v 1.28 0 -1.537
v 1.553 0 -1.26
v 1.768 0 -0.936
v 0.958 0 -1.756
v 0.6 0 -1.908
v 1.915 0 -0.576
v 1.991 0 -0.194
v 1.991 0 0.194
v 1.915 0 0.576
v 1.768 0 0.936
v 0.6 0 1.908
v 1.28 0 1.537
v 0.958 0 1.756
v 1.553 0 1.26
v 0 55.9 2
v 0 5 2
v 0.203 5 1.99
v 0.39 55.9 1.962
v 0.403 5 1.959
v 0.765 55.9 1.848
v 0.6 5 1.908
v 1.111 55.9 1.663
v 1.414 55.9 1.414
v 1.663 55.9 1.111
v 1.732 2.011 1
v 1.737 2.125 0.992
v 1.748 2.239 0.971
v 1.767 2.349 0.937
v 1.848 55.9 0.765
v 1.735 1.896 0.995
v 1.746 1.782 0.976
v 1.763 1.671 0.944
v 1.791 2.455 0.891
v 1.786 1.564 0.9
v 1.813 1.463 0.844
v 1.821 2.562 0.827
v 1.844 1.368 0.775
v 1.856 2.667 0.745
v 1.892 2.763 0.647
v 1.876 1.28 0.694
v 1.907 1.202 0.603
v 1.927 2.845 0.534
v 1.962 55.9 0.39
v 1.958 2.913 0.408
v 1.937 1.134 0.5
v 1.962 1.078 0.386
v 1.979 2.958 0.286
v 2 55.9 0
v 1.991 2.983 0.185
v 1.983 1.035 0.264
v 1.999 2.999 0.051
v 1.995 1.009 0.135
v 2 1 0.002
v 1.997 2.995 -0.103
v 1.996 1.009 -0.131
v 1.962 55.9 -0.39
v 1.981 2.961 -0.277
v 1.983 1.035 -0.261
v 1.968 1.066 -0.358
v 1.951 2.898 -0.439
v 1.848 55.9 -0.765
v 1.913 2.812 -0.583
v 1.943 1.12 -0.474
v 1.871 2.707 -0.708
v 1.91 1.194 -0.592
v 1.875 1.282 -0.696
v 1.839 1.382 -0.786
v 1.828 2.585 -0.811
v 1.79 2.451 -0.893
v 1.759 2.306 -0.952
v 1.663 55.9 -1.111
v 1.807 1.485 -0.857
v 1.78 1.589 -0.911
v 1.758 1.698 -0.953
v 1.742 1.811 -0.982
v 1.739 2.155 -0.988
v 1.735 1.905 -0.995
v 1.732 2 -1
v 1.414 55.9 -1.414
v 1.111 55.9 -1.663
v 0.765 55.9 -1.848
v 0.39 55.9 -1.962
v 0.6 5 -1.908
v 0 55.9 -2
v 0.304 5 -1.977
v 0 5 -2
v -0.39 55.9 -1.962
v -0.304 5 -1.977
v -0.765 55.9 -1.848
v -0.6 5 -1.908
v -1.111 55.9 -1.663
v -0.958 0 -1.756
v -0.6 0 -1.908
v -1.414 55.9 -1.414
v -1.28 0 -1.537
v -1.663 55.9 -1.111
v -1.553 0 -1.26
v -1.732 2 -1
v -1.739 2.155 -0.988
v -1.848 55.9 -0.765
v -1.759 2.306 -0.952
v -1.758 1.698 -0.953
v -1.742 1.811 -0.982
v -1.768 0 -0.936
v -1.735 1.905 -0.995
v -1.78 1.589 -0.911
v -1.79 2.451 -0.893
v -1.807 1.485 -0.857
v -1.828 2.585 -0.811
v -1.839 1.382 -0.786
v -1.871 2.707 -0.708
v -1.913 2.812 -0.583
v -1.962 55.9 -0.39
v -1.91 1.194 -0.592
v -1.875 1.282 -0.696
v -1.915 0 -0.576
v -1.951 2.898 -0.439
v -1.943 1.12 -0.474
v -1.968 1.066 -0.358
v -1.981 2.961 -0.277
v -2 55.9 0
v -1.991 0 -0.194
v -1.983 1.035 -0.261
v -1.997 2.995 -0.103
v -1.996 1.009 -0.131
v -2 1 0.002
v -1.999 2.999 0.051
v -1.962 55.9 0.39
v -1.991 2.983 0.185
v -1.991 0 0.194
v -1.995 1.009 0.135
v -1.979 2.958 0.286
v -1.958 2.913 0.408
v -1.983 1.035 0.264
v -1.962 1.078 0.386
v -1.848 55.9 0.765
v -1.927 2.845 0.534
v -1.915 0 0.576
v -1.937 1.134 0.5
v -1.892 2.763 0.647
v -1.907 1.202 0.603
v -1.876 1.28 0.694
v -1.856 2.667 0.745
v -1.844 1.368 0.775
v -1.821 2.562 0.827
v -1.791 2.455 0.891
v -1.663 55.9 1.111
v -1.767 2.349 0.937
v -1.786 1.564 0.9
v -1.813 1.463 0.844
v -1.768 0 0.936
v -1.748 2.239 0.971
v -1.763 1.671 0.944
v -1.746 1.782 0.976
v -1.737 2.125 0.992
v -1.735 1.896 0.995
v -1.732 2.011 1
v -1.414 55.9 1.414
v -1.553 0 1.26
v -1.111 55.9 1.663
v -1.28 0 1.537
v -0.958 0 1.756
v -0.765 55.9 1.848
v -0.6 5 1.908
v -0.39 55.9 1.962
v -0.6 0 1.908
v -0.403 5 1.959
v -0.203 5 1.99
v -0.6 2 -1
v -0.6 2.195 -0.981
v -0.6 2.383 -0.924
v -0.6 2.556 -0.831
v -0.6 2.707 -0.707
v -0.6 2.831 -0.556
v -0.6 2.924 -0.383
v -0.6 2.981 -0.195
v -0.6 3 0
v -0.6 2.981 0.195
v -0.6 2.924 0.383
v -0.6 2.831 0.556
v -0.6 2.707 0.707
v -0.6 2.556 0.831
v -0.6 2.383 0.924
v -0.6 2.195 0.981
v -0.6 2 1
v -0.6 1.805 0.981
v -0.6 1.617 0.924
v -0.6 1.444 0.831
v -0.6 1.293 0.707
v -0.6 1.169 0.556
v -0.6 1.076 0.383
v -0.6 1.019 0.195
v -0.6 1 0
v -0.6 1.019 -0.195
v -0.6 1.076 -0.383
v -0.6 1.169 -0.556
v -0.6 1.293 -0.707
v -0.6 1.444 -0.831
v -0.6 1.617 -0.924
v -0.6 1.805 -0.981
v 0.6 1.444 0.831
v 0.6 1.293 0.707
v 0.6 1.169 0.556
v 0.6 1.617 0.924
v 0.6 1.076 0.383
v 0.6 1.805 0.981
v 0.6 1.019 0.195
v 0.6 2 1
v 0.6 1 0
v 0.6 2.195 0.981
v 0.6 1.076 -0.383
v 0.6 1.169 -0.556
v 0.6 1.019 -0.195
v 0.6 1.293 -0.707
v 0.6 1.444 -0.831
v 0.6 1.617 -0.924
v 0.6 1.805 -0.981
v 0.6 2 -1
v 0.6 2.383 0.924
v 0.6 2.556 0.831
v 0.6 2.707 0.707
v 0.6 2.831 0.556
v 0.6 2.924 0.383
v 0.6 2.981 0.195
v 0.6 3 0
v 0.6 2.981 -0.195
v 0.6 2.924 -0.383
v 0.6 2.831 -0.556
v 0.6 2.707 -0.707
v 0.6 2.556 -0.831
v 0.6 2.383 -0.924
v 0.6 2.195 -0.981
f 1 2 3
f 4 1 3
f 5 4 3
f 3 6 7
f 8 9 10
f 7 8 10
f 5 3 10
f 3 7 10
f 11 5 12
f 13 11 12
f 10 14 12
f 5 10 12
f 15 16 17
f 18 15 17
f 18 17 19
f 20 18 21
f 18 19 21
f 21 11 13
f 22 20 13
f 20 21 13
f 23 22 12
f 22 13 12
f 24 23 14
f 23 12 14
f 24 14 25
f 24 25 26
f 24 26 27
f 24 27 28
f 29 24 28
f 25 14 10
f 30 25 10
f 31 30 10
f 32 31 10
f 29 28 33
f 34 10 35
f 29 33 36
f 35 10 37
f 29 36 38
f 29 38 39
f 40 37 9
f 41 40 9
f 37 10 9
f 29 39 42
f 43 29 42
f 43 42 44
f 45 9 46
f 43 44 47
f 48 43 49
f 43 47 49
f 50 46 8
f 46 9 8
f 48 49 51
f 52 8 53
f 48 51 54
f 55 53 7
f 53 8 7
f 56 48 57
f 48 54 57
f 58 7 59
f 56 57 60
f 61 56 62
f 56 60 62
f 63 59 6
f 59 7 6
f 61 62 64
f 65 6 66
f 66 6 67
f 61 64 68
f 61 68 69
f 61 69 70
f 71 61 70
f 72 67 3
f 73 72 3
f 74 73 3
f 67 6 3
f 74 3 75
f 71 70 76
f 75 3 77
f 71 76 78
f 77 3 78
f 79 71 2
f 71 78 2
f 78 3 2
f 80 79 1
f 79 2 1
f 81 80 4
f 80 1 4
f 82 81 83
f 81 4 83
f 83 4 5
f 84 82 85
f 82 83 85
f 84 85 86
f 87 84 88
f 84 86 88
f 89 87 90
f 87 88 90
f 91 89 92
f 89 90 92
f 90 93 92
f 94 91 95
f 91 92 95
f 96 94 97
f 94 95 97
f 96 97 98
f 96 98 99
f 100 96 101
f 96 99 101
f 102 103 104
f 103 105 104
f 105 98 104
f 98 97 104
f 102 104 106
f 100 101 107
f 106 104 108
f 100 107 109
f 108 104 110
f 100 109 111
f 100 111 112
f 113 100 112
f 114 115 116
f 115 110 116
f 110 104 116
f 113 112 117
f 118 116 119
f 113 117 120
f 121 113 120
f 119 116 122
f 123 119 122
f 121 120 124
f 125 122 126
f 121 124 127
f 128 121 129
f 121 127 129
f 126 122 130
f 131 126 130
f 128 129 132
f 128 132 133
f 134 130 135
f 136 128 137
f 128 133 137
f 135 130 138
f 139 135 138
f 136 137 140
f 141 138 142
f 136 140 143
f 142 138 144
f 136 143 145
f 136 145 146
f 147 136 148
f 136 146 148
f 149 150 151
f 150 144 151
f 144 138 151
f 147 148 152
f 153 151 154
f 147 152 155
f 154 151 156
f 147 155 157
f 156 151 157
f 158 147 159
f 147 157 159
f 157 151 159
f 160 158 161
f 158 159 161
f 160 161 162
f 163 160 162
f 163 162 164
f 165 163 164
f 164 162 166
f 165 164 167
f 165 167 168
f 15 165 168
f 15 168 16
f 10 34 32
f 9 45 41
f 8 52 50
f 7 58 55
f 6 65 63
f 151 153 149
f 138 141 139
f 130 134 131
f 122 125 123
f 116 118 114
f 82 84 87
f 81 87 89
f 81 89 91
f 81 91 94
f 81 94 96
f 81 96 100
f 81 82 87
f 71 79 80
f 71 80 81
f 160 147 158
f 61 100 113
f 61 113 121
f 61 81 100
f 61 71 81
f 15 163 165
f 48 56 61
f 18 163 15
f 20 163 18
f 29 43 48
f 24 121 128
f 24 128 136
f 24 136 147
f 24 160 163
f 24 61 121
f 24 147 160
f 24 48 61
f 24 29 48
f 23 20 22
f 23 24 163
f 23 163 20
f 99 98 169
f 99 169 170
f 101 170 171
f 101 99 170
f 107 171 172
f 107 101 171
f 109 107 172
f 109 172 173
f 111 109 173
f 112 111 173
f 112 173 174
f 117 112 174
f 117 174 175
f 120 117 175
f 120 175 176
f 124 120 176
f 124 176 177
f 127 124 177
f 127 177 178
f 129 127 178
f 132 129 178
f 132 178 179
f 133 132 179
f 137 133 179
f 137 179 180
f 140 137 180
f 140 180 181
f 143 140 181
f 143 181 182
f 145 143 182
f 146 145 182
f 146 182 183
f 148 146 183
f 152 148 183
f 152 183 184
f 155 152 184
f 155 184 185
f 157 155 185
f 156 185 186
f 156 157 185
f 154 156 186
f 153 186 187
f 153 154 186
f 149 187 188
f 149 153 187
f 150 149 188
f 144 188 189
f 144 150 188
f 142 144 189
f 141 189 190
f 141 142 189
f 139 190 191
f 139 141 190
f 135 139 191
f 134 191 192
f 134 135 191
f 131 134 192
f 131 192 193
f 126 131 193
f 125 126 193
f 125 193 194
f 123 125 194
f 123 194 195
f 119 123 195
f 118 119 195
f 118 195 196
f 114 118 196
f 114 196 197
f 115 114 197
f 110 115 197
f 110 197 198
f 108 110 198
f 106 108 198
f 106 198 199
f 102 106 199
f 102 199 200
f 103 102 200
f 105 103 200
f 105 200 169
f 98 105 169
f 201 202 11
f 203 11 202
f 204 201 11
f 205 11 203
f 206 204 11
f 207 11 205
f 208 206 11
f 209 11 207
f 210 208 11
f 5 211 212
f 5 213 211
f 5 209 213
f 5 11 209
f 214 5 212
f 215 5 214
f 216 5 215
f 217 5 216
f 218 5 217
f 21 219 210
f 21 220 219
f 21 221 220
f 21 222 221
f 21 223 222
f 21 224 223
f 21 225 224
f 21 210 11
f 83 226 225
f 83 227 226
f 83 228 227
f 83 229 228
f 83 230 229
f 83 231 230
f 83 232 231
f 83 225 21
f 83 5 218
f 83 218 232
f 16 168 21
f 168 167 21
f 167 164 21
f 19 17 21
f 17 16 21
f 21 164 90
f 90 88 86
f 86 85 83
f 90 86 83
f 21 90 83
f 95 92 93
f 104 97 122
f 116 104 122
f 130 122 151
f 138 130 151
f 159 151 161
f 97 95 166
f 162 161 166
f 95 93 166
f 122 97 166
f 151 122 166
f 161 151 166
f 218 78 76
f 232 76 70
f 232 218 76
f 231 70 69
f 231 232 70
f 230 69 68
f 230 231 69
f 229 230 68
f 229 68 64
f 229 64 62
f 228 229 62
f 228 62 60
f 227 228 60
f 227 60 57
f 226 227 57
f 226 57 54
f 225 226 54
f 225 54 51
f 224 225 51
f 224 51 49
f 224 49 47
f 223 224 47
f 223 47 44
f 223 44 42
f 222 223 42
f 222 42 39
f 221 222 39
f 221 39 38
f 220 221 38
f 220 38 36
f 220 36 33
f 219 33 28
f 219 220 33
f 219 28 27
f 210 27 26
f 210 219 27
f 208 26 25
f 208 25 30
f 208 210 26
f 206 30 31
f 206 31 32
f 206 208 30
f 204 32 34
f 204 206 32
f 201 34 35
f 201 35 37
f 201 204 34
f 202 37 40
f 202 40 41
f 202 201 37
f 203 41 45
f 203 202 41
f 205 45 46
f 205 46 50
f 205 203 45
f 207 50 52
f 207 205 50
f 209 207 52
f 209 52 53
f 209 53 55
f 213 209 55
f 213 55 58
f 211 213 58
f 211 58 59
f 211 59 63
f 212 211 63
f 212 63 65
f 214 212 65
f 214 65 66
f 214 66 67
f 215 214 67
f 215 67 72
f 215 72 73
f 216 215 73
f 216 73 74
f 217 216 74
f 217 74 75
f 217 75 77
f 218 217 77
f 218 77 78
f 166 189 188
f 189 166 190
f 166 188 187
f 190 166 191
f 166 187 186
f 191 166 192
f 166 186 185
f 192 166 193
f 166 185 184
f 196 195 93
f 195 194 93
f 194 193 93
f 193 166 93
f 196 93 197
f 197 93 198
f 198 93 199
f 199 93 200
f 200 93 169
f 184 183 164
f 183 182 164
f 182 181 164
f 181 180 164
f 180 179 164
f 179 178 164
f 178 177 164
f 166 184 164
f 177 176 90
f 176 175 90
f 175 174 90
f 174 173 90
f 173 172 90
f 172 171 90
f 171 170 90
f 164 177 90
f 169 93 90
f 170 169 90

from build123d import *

# Parameters (mm, degrees)
SKETCH_1_R               = 2
EXTRUDE_1_DEPTH          = 55.9
CUT_EXTRUDE_1_DEPTH      = 56.97151061
CUT_EXTRUDE_1_DEPTH_BACK = 56.97151061
SKETCH_2_W               = 1.2
SKETCH_2_H               = 10
CUT_EXTRUDE_2_DEPTH      = 56.97151061
CUT_EXTRUDE_2_DEPTH_BACK = 56.97151061
SKETCH_3_R               = 1


with BuildPart() as part:
    # 草图1 → 凸台-拉伸1 (new body)
    with BuildSketch(Plane(origin=(0, 0, 0), x_dir=(1, 0, 0), z_dir=(0, 1, 0))):
        with Locations(Location((0, 0, 0), (0, 0, 270))):
            Circle(SKETCH_1_R)
    extrude(amount=EXTRUDE_1_DEPTH)

    # 草图2 → 切除-拉伸1 (cut, two sides: drawn at the far end of the back side and taken through both)
    with BuildSketch(Plane.XY.offset(-CUT_EXTRUDE_1_DEPTH_BACK)):
        Rectangle(SKETCH_2_W, SKETCH_2_H)
    extrude(amount=CUT_EXTRUDE_1_DEPTH + CUT_EXTRUDE_1_DEPTH_BACK, mode=Mode.SUBTRACT)

    # 草图3 → 切除-拉伸2 (cut, two sides: drawn at the far end of the back side and taken through both)
    with BuildSketch(Plane(origin=(0, 0, 0), x_dir=(0, 0, -1), z_dir=(1, 0, 0)).offset(-CUT_EXTRUDE_2_DEPTH_BACK)):
        with Locations((0, 2)):
            Circle(SKETCH_3_R)
    extrude(amount=CUT_EXTRUDE_2_DEPTH + CUT_EXTRUDE_2_DEPTH_BACK, mode=Mode.SUBTRACT)


solid = part.part
